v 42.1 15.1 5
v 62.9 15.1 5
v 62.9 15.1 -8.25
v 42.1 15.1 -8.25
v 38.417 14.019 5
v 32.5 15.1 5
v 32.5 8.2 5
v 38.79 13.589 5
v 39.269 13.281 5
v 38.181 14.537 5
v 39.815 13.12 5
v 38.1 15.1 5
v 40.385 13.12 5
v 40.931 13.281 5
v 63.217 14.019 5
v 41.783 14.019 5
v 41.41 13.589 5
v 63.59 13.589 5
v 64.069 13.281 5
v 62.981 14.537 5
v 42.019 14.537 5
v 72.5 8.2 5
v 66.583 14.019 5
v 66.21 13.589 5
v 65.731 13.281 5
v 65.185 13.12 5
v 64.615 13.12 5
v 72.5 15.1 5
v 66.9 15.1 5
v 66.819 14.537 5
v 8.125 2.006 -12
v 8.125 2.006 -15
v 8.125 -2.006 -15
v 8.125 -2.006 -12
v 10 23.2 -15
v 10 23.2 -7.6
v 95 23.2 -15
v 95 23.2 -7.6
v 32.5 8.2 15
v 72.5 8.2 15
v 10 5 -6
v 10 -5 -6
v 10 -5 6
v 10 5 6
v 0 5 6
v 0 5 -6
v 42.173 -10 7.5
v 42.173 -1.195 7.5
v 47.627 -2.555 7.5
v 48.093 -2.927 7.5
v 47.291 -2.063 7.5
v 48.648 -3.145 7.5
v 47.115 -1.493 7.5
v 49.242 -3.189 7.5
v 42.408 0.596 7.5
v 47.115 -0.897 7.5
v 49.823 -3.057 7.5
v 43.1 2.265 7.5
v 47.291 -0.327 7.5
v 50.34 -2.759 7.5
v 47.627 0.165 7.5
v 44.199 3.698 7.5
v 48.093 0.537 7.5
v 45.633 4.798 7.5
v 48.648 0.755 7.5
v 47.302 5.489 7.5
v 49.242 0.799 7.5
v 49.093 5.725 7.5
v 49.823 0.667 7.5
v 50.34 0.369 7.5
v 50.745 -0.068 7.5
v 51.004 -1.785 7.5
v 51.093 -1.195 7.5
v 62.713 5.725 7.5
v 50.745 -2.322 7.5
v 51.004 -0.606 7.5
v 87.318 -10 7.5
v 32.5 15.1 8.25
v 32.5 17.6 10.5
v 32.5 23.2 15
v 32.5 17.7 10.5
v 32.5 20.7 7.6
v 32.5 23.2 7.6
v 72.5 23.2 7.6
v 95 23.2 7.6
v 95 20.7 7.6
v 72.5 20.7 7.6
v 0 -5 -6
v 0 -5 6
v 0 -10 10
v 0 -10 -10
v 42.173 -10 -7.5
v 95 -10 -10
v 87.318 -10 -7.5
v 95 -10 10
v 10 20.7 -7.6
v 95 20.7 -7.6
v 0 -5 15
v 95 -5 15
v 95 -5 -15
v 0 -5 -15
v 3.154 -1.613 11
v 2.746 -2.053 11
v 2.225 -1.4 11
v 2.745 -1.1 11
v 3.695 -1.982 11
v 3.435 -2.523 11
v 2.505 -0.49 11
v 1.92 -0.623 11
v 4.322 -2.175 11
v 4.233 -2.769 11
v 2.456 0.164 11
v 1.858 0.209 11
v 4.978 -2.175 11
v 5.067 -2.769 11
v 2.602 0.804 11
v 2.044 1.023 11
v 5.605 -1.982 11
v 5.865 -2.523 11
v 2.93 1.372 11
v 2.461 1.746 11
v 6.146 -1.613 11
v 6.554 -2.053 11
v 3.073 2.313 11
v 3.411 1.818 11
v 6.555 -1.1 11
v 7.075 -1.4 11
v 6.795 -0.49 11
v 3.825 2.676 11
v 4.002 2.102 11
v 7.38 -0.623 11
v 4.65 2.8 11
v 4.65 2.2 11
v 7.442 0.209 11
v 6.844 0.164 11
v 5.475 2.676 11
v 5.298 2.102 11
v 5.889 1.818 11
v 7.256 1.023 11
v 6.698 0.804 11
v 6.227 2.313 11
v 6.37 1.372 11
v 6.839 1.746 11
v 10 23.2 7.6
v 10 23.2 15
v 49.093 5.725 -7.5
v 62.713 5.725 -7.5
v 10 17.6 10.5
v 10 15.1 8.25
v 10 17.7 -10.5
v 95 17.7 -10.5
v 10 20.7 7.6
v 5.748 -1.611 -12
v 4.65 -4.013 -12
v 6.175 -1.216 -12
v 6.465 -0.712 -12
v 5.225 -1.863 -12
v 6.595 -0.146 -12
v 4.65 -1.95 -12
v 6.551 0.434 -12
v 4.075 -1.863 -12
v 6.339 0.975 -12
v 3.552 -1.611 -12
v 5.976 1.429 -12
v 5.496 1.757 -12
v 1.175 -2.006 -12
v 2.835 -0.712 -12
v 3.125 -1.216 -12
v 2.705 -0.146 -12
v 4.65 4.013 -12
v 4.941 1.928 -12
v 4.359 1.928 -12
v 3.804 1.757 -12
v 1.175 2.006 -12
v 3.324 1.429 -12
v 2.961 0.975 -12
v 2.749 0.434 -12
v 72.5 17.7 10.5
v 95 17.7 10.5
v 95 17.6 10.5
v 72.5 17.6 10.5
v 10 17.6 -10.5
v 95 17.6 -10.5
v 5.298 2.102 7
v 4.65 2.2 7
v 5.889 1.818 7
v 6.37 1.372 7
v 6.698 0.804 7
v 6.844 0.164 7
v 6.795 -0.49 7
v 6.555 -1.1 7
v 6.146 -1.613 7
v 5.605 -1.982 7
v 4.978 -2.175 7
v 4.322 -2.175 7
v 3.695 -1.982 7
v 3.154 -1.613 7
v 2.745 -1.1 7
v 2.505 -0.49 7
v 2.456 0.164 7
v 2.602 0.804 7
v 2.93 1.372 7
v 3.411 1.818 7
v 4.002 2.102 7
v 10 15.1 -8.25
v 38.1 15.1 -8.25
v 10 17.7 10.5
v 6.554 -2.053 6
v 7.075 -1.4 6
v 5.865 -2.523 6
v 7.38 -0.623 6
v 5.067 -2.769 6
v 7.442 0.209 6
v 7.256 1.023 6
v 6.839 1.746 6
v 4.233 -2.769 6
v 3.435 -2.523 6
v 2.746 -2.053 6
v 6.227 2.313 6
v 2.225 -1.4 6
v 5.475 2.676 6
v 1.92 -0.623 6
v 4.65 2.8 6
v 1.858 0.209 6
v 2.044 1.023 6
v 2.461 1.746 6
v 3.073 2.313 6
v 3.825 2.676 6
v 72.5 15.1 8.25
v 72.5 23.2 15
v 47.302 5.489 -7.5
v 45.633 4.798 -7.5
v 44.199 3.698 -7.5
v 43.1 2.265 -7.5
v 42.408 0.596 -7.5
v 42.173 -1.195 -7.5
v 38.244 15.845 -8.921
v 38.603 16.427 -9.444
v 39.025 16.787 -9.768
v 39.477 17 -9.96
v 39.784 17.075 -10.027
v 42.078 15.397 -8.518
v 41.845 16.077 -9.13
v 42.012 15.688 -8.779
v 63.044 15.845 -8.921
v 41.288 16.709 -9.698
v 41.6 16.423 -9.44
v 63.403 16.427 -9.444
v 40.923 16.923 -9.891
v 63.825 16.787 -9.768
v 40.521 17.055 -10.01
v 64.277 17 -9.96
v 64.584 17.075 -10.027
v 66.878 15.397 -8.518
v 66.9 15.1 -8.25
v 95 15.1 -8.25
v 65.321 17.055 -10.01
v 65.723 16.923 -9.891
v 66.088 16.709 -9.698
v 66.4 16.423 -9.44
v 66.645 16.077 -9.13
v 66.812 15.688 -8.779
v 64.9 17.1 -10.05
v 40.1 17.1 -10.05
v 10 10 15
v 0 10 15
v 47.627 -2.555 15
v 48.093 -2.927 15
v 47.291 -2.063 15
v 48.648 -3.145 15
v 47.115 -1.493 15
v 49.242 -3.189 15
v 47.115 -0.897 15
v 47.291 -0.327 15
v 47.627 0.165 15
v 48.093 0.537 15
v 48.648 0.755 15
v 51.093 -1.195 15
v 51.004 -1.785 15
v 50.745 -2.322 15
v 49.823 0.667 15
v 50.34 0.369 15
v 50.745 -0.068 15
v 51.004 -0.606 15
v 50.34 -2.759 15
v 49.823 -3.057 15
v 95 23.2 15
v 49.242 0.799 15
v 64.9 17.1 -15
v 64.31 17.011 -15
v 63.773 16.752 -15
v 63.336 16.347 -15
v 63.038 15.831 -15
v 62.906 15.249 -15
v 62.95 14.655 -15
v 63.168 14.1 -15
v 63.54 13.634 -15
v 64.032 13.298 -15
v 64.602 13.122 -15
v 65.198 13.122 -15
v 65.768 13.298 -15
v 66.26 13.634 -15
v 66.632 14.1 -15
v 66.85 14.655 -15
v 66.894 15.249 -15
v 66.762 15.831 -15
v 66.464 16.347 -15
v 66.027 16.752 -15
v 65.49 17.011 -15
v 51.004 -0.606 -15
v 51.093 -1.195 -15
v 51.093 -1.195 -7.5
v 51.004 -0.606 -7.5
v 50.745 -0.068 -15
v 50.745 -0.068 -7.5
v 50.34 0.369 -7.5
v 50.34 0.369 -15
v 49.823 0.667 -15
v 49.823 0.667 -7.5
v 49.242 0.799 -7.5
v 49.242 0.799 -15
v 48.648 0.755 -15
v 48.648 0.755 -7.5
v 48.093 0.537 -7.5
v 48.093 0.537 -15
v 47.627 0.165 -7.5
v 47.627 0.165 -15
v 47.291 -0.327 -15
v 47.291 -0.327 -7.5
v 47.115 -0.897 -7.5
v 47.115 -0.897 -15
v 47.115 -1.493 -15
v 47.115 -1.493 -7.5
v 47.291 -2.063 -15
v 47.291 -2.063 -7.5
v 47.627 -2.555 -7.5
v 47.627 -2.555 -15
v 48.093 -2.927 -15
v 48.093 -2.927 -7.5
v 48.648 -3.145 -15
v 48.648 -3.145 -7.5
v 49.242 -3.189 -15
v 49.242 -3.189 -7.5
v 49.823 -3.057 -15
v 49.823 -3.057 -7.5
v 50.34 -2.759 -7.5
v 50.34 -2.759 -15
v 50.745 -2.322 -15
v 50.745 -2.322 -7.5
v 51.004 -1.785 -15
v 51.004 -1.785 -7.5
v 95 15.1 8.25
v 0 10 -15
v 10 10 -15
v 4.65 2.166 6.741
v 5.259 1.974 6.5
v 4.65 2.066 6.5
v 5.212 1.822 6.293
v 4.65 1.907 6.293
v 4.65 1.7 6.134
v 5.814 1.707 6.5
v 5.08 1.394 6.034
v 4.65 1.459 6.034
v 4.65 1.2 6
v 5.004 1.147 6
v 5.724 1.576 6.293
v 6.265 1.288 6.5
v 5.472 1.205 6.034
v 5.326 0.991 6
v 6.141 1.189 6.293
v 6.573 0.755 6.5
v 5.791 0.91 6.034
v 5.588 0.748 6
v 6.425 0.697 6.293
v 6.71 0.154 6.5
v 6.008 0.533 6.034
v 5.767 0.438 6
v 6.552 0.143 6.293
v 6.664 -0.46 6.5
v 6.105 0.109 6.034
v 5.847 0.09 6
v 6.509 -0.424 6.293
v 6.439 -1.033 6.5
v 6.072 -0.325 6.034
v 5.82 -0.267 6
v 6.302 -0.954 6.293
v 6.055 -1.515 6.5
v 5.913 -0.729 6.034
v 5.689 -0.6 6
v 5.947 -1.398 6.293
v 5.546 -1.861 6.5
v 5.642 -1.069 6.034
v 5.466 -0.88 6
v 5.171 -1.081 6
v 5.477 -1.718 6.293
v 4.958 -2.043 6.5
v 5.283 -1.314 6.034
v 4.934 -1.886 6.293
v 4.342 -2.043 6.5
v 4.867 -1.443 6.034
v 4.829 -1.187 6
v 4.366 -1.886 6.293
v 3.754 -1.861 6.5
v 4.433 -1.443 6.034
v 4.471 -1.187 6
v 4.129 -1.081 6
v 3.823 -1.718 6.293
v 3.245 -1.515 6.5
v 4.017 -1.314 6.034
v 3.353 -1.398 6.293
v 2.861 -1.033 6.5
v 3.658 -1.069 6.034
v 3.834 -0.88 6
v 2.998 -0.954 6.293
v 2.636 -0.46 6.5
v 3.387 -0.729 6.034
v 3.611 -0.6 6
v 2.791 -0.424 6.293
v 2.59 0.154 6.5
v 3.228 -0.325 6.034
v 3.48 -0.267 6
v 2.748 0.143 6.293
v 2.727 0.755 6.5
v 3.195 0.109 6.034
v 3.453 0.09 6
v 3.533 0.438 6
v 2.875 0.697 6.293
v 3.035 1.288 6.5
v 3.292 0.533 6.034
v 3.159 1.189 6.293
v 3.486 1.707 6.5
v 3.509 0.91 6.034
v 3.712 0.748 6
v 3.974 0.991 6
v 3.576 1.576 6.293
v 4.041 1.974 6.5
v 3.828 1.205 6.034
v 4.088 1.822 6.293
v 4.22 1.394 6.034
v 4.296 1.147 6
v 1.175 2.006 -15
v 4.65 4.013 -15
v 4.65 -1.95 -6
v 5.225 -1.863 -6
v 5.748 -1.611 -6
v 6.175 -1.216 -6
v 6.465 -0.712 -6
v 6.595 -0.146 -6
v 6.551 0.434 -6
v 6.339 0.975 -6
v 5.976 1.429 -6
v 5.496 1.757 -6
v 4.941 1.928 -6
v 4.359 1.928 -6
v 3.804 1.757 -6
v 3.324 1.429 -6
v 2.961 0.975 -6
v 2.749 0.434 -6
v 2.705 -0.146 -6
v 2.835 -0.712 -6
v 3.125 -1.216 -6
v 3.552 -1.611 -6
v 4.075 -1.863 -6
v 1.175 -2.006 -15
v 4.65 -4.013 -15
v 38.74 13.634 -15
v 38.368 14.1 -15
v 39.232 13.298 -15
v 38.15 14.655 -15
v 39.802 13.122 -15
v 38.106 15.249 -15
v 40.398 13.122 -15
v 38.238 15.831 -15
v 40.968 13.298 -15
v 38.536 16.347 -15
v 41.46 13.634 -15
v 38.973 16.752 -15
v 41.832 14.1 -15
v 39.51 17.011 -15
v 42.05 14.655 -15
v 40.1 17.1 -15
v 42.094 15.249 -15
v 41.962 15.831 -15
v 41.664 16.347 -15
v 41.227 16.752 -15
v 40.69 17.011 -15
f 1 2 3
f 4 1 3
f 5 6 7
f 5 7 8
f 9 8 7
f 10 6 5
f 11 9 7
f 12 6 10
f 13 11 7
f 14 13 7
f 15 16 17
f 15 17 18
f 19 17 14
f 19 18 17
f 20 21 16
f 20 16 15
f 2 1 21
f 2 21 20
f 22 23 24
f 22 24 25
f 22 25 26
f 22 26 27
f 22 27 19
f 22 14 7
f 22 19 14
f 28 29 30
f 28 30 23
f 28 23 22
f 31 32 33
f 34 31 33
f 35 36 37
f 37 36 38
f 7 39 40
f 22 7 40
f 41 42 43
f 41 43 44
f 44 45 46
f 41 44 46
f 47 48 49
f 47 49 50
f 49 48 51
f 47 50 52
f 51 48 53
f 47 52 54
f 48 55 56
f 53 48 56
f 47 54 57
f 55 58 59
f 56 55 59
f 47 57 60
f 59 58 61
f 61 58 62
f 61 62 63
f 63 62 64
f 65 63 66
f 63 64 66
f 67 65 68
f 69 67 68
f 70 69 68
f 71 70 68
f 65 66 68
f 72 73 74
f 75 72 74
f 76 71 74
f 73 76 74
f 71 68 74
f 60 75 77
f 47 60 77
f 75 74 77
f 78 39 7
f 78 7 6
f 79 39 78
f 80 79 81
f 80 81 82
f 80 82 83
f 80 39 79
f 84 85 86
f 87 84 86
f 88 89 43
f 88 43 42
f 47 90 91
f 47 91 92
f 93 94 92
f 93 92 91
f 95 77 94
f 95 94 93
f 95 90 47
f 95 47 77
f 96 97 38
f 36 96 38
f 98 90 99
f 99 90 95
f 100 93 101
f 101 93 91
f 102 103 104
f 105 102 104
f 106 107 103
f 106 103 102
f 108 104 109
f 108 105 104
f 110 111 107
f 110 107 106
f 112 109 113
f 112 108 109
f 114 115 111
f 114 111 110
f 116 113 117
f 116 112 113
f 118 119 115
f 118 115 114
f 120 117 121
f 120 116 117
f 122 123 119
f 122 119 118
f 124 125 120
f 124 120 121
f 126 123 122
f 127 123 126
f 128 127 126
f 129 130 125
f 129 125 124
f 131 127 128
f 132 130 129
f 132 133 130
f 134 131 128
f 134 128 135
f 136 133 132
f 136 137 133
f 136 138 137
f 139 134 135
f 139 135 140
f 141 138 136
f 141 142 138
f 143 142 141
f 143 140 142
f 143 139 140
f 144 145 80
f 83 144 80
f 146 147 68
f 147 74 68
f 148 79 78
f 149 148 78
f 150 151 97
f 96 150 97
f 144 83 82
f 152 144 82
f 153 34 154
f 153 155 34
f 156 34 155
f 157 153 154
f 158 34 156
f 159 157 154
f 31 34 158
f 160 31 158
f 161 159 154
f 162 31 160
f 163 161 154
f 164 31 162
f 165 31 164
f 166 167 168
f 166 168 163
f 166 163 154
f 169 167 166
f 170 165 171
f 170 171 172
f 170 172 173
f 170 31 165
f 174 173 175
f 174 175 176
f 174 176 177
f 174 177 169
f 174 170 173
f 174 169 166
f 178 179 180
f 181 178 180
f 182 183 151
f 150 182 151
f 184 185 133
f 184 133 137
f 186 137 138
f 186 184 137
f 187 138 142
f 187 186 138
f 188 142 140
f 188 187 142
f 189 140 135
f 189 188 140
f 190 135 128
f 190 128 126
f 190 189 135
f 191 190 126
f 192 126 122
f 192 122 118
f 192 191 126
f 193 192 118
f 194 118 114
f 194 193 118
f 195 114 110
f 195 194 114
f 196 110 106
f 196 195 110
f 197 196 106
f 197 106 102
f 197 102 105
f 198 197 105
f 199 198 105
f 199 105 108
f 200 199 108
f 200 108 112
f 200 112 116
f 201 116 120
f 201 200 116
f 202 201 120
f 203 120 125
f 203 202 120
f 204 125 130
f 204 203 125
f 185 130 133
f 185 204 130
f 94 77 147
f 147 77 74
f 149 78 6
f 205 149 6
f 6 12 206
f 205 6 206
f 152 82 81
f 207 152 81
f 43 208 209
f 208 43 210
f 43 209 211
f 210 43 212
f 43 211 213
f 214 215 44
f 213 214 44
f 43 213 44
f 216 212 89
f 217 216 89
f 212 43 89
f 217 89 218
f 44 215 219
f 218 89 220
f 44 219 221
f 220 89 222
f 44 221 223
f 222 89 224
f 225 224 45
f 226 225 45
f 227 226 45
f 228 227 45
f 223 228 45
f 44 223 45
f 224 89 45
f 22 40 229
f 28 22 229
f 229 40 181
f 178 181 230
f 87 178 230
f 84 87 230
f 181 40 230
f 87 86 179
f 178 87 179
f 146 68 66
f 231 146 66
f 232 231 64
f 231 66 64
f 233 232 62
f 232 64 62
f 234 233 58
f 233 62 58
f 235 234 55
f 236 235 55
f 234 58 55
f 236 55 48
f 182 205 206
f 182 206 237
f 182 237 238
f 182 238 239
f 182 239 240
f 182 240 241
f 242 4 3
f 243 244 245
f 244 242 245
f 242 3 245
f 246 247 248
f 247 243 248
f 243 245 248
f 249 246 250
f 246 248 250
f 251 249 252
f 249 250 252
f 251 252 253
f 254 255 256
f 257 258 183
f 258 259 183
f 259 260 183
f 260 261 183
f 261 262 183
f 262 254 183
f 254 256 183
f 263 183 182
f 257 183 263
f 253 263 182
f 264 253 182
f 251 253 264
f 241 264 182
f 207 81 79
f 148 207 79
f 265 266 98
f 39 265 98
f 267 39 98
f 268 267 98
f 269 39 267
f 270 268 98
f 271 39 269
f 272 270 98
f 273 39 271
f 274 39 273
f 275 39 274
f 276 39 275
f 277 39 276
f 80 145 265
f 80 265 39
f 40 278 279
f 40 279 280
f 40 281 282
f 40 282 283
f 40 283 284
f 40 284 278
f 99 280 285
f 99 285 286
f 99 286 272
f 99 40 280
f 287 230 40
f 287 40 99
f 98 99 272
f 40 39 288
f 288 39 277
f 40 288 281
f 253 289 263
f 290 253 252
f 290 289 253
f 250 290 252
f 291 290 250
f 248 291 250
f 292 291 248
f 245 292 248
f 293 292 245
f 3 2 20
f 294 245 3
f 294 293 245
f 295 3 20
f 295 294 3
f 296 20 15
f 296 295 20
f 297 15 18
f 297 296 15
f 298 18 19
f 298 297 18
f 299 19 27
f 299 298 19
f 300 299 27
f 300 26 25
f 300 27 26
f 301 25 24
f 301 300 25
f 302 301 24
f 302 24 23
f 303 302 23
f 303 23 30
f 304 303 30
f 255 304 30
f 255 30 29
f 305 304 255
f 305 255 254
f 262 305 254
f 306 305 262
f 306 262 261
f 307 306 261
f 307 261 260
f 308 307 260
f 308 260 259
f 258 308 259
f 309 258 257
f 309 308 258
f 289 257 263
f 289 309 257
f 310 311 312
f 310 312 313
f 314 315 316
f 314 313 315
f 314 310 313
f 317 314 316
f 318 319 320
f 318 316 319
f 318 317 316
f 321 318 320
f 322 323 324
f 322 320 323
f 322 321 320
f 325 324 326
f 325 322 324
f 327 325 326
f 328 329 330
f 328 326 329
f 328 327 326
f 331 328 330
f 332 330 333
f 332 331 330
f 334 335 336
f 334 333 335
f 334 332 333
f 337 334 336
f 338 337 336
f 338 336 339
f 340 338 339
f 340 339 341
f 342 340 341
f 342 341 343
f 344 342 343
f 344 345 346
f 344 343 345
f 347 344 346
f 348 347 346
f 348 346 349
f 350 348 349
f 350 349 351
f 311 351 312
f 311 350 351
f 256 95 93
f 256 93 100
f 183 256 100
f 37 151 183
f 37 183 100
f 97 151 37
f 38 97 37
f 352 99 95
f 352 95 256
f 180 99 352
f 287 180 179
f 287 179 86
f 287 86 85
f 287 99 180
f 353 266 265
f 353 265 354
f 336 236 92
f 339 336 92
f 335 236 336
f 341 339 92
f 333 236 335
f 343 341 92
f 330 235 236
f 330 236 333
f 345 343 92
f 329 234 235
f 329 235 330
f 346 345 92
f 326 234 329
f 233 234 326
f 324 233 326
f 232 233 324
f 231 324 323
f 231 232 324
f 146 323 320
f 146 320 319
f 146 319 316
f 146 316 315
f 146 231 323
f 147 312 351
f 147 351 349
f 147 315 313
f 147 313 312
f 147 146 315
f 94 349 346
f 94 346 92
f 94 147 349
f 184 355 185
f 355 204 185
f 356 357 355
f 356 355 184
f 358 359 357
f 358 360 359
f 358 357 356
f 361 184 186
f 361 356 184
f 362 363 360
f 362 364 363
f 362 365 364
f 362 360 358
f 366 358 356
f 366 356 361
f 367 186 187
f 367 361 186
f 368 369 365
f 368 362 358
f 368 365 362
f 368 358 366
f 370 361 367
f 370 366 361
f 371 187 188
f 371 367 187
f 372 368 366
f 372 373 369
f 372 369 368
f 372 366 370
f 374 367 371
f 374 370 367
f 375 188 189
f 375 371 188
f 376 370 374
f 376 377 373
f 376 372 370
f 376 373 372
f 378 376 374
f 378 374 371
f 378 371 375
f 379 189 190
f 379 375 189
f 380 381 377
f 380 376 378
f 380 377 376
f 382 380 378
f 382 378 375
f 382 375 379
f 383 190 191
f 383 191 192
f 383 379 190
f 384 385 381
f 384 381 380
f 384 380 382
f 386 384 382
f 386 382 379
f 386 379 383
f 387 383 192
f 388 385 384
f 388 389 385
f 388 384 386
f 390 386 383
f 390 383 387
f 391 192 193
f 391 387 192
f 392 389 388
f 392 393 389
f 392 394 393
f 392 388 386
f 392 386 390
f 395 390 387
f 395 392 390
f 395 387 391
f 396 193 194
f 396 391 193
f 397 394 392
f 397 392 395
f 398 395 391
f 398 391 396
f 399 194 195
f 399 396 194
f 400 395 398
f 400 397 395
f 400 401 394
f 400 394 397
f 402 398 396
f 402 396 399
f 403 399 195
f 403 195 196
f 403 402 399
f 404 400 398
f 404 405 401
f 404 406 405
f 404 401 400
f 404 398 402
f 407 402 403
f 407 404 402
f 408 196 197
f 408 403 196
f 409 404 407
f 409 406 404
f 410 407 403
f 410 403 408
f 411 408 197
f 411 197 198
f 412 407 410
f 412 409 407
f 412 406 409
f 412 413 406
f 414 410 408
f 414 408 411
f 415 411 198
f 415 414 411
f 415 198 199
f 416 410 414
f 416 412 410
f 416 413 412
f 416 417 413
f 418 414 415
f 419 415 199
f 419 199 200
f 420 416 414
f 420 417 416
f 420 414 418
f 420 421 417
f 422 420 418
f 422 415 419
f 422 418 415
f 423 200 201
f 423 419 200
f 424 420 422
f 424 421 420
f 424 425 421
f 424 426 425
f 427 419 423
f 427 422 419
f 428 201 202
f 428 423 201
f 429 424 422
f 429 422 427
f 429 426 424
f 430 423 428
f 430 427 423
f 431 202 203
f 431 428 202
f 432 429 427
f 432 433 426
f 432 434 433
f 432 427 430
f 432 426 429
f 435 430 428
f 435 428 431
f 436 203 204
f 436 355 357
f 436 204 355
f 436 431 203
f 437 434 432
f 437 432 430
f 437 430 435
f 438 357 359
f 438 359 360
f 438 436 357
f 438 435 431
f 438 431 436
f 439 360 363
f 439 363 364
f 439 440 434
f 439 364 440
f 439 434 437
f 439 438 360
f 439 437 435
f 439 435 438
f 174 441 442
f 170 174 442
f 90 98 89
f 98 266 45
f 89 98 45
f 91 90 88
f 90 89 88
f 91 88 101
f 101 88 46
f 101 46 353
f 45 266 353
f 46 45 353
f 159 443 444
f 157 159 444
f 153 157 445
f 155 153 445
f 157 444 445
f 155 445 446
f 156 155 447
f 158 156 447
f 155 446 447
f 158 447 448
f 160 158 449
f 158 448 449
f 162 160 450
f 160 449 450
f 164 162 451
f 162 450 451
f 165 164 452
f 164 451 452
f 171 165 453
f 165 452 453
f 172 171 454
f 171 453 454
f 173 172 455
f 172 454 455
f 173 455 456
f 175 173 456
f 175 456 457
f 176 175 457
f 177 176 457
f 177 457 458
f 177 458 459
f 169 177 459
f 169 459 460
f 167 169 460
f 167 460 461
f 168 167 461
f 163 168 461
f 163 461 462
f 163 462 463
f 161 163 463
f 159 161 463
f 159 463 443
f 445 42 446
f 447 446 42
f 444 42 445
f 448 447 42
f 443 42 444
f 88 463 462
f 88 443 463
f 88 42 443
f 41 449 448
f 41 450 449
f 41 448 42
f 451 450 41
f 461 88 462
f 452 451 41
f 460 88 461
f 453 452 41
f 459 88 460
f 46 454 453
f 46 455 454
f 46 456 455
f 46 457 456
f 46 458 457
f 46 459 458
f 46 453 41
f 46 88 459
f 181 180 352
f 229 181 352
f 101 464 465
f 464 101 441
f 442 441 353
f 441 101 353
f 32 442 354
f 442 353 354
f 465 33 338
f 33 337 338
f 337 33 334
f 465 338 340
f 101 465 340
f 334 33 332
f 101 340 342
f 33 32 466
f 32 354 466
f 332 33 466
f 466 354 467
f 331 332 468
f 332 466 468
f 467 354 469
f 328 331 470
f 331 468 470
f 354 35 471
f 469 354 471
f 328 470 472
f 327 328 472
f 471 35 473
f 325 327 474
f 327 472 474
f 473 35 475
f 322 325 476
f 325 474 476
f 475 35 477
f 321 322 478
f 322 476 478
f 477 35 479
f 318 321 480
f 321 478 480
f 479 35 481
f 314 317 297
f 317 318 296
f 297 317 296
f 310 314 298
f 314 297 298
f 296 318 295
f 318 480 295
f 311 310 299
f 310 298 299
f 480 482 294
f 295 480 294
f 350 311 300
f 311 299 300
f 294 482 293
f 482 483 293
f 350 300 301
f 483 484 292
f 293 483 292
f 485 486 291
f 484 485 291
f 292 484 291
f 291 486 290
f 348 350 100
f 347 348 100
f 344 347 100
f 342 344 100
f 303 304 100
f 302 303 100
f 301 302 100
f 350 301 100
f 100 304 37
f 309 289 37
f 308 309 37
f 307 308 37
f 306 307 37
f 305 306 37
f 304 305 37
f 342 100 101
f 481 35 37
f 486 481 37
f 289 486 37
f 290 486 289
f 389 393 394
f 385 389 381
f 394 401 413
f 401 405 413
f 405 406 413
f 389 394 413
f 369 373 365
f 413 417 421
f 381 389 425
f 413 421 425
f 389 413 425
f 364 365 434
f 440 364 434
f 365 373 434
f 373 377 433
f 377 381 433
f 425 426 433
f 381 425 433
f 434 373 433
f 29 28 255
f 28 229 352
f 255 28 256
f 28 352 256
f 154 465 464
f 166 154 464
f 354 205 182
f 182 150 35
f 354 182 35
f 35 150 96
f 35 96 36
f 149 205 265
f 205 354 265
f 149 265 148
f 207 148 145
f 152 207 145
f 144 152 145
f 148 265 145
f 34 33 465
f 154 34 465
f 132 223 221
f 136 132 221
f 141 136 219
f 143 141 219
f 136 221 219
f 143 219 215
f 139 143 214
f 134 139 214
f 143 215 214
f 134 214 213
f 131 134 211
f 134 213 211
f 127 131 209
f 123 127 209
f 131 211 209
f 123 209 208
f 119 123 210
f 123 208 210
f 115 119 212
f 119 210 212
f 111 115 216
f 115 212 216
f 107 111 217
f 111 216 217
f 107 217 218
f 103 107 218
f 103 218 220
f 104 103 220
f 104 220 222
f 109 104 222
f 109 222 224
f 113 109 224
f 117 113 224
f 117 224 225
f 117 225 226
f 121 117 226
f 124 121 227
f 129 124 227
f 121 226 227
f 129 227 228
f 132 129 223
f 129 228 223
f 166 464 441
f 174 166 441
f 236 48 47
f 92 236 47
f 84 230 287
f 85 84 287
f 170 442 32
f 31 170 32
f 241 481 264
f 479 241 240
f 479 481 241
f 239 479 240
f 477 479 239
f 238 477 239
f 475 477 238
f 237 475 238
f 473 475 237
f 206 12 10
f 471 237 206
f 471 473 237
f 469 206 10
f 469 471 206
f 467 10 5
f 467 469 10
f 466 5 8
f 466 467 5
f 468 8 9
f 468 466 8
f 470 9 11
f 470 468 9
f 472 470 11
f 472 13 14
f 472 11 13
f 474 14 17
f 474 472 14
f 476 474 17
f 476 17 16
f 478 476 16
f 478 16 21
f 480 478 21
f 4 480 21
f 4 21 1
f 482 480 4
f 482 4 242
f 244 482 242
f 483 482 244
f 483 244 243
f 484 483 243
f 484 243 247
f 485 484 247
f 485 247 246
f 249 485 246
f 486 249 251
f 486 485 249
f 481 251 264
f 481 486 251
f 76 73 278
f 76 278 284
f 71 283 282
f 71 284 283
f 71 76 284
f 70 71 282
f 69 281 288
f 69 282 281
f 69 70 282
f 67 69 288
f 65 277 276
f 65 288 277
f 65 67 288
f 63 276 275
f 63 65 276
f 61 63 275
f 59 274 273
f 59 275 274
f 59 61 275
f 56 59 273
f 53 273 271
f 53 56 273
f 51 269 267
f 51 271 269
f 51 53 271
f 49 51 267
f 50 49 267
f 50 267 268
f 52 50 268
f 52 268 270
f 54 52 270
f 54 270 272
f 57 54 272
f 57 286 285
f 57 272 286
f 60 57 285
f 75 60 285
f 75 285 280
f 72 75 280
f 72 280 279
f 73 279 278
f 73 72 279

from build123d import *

# Parameters (mm, degrees)
SKETCH_1_W               = 30
SKETCH_1_H               = 20
SKETCH_1_W_2             = 12
SKETCH_1_H_2             = 10
EXTRUDE_1_DEPTH          = 10
CUT_EXTRUDE_1_DEPTH      = 3
SKETCH_4_R               = 1.95
CUT_EXTRUDE_2_DEPTH      = 30
SKETCH_8_R               = 2.8
SKETCH_8_R_2             = 2.2
CUT_EXTRUDE_3_DEPTH      = 5
FILLET_1_R               = 1
SKETCH_12_W              = 85
SKETCH_12_H              = 33.2
EXTRUDE_3_DEPTH          = 15
CUT_EXTRUDE_4_DEPTH      = 100
CHAMFER_1_SIZE           = 5
CUT_EXTRUDE_5_DEPTH      = 99.935534567
CUT_EXTRUDE_5_DEPTH_BACK = 99.935534567
SKETCH_14_R              = 2
CUT_EXTRUDE_6_DEPTH      = 7.5
CUT_EXTRUDE_7_DEPTH      = 99.935534567
CUT_EXTRUDE_7_DEPTH_BACK = 99.935534567
SKETCH_16_R              = 2
SKETCH_17_W              = 40
SKETCH_17_H              = 15
CUT_EXTRUDE_8_DEPTH      = 10


with BuildPart() as part:
    # 스케치1 → 보스-돌출1 (new body)
    with BuildSketch(Plane(origin=(0, 0, 0), x_dir=(0, 0, -1), z_dir=(1, 0, 0))):
        Rectangle(SKETCH_1_W, SKETCH_1_H)
        Rectangle(SKETCH_1_W_2, SKETCH_1_H_2, mode=Mode.SUBTRACT)
    extrude(amount=EXTRUDE_1_DEPTH)

    # 스케치2 → 컷-돌출1 (cut)
    with BuildSketch(Plane(origin=(0, 0, -15), x_dir=(-1, 0, 0), z_dir=(0, 0, -1))):
        Polygon((-1.175, -2.006292185), (-1.175, 2.006292185), (-4.65, 4.012584371), (-8.125, 2.006292185), (-8.125, -2.006292185), (-4.65, -4.012584371), align=None)
    extrude(amount=-CUT_EXTRUDE_1_DEPTH, mode=Mode.SUBTRACT)

    # 스케치4 → 컷-돌출2 (cut)
    with BuildSketch(Plane.XY):
        with Locations(Location((4.65, 0, 0), (0, 0, 270))):
            Circle(SKETCH_4_R)
    extrude(amount=-CUT_EXTRUDE_2_DEPTH, mode=Mode.SUBTRACT)

    # 스케치8 → 컷-돌출3 (cut)
    with BuildSketch(Plane(origin=(0, 0, 6), x_dir=(-1, 0, 0), z_dir=(0, 0, -1))):
        with Locations(Location((-4.65, 0, 0), (0, 0, 90))):
            Circle(SKETCH_8_R)
        with Locations(Location((-4.65, 0, 0), (0, 0, 90))):
            Circle(SKETCH_8_R_2, mode=Mode.SUBTRACT)
    extrude(amount=-CUT_EXTRUDE_3_DEPTH, mode=Mode.SUBTRACT)

    # 필렛1
    fillet_1_edges = [part.edges().sort_by_distance(p)[0] for p in [
        (4.65, -2.2, 6),
    ]]
    fillet(fillet_1_edges, radius=FILLET_1_R)

    # 스케치12 → 보스-돌출3 (add, symmetric)
    with BuildSketch(Plane.XY):
        with Locations((52.5, 6.6)):
            Rectangle(SKETCH_12_W, SKETCH_12_H)
    extrude(amount=EXTRUDE_3_DEPTH, both=True)

    # 스케치13 → 컷-돌출4 (cut, symmetric)
    with BuildSketch(Plane(origin=(0, 0, 0), x_dir=(0, 0, -1), z_dir=(1, 0, 0))):
        Polygon((7.6, 23.2), (-7.6, 23.2), (-7.6, 20.7), (-10.5, 17.7), (-10.5, 17.6), (-8.25, 15.1), (8.25, 15.1), (10.5, 17.6), (10.5, 17.7), (7.6, 20.7), align=None)
    extrude(amount=CUT_EXTRUDE_4_DEPTH, both=True, mode=Mode.SUBTRACT)

    # 모따기1
    chamfer_1_edges = [part.edges().sort_by_distance(p)[0] for p in [
        (47.5, -10, -15),
        (47.5, -10, 15),
    ]]
    chamfer(chamfer_1_edges, length=CHAMFER_1_SIZE)

    # 스케치14 → 컷-돌출5 (cut, two sides: drawn at the far end of the back side and taken through both)
    with BuildSketch(Plane.XY.offset(-CUT_EXTRUDE_5_DEPTH_BACK)):
        with Locations(Location((40.1, 15.1, 0), (0, 0, 90))):
            Circle(SKETCH_14_R)
        with Locations(Location((64.9, 15.1, 0), (0, 0, 90))):
            Circle(SKETCH_14_R)
    extrude(amount=CUT_EXTRUDE_5_DEPTH + CUT_EXTRUDE_5_DEPTH_BACK, mode=Mode.SUBTRACT)

    # 스케치15 → 컷-돌출6 (cut, symmetric)
    with BuildSketch(Plane.XY):
        with BuildLine():
            Line((62.713186115, 5.72501597), (49.092705045, 5.72501597))
            ThreePointArc((49.092705045, 5.72501597), (44.199467341, 3.698170549), (42.17262192, -1.195067155))
            Line((42.17262192, -1.195067155), (42.17262192, -12.628733774))
            Line((42.17262192, -12.628733774), (87.317926114, -12.628733774))
            Line((87.317926114, -12.628733774), (87.317926114, -10))
            Line((87.317926114, -10), (62.713186115, 5.72501597))
        make_face()
    extrude(amount=CUT_EXTRUDE_6_DEPTH, both=True, mode=Mode.SUBTRACT)

    # 스케치16 → 컷-돌출7 (cut, two sides: drawn at the far end of the back side and taken through both)
    with BuildSketch(Plane.XY.offset(-CUT_EXTRUDE_7_DEPTH_BACK)):
        with Locations((49.092705045, -1.195067155)):
            Circle(SKETCH_16_R)
    extrude(amount=CUT_EXTRUDE_7_DEPTH + CUT_EXTRUDE_7_DEPTH_BACK, mode=Mode.SUBTRACT)

    # 스케치17 → 컷-돌출8 (cut)
    with BuildSketch(Plane.XY.offset(15)):
        with Locations((52.5, 15.7)):
            Rectangle(SKETCH_17_W, SKETCH_17_H)
    extrude(amount=-CUT_EXTRUDE_8_DEPTH, mode=Mode.SUBTRACT)


solid = part.part
